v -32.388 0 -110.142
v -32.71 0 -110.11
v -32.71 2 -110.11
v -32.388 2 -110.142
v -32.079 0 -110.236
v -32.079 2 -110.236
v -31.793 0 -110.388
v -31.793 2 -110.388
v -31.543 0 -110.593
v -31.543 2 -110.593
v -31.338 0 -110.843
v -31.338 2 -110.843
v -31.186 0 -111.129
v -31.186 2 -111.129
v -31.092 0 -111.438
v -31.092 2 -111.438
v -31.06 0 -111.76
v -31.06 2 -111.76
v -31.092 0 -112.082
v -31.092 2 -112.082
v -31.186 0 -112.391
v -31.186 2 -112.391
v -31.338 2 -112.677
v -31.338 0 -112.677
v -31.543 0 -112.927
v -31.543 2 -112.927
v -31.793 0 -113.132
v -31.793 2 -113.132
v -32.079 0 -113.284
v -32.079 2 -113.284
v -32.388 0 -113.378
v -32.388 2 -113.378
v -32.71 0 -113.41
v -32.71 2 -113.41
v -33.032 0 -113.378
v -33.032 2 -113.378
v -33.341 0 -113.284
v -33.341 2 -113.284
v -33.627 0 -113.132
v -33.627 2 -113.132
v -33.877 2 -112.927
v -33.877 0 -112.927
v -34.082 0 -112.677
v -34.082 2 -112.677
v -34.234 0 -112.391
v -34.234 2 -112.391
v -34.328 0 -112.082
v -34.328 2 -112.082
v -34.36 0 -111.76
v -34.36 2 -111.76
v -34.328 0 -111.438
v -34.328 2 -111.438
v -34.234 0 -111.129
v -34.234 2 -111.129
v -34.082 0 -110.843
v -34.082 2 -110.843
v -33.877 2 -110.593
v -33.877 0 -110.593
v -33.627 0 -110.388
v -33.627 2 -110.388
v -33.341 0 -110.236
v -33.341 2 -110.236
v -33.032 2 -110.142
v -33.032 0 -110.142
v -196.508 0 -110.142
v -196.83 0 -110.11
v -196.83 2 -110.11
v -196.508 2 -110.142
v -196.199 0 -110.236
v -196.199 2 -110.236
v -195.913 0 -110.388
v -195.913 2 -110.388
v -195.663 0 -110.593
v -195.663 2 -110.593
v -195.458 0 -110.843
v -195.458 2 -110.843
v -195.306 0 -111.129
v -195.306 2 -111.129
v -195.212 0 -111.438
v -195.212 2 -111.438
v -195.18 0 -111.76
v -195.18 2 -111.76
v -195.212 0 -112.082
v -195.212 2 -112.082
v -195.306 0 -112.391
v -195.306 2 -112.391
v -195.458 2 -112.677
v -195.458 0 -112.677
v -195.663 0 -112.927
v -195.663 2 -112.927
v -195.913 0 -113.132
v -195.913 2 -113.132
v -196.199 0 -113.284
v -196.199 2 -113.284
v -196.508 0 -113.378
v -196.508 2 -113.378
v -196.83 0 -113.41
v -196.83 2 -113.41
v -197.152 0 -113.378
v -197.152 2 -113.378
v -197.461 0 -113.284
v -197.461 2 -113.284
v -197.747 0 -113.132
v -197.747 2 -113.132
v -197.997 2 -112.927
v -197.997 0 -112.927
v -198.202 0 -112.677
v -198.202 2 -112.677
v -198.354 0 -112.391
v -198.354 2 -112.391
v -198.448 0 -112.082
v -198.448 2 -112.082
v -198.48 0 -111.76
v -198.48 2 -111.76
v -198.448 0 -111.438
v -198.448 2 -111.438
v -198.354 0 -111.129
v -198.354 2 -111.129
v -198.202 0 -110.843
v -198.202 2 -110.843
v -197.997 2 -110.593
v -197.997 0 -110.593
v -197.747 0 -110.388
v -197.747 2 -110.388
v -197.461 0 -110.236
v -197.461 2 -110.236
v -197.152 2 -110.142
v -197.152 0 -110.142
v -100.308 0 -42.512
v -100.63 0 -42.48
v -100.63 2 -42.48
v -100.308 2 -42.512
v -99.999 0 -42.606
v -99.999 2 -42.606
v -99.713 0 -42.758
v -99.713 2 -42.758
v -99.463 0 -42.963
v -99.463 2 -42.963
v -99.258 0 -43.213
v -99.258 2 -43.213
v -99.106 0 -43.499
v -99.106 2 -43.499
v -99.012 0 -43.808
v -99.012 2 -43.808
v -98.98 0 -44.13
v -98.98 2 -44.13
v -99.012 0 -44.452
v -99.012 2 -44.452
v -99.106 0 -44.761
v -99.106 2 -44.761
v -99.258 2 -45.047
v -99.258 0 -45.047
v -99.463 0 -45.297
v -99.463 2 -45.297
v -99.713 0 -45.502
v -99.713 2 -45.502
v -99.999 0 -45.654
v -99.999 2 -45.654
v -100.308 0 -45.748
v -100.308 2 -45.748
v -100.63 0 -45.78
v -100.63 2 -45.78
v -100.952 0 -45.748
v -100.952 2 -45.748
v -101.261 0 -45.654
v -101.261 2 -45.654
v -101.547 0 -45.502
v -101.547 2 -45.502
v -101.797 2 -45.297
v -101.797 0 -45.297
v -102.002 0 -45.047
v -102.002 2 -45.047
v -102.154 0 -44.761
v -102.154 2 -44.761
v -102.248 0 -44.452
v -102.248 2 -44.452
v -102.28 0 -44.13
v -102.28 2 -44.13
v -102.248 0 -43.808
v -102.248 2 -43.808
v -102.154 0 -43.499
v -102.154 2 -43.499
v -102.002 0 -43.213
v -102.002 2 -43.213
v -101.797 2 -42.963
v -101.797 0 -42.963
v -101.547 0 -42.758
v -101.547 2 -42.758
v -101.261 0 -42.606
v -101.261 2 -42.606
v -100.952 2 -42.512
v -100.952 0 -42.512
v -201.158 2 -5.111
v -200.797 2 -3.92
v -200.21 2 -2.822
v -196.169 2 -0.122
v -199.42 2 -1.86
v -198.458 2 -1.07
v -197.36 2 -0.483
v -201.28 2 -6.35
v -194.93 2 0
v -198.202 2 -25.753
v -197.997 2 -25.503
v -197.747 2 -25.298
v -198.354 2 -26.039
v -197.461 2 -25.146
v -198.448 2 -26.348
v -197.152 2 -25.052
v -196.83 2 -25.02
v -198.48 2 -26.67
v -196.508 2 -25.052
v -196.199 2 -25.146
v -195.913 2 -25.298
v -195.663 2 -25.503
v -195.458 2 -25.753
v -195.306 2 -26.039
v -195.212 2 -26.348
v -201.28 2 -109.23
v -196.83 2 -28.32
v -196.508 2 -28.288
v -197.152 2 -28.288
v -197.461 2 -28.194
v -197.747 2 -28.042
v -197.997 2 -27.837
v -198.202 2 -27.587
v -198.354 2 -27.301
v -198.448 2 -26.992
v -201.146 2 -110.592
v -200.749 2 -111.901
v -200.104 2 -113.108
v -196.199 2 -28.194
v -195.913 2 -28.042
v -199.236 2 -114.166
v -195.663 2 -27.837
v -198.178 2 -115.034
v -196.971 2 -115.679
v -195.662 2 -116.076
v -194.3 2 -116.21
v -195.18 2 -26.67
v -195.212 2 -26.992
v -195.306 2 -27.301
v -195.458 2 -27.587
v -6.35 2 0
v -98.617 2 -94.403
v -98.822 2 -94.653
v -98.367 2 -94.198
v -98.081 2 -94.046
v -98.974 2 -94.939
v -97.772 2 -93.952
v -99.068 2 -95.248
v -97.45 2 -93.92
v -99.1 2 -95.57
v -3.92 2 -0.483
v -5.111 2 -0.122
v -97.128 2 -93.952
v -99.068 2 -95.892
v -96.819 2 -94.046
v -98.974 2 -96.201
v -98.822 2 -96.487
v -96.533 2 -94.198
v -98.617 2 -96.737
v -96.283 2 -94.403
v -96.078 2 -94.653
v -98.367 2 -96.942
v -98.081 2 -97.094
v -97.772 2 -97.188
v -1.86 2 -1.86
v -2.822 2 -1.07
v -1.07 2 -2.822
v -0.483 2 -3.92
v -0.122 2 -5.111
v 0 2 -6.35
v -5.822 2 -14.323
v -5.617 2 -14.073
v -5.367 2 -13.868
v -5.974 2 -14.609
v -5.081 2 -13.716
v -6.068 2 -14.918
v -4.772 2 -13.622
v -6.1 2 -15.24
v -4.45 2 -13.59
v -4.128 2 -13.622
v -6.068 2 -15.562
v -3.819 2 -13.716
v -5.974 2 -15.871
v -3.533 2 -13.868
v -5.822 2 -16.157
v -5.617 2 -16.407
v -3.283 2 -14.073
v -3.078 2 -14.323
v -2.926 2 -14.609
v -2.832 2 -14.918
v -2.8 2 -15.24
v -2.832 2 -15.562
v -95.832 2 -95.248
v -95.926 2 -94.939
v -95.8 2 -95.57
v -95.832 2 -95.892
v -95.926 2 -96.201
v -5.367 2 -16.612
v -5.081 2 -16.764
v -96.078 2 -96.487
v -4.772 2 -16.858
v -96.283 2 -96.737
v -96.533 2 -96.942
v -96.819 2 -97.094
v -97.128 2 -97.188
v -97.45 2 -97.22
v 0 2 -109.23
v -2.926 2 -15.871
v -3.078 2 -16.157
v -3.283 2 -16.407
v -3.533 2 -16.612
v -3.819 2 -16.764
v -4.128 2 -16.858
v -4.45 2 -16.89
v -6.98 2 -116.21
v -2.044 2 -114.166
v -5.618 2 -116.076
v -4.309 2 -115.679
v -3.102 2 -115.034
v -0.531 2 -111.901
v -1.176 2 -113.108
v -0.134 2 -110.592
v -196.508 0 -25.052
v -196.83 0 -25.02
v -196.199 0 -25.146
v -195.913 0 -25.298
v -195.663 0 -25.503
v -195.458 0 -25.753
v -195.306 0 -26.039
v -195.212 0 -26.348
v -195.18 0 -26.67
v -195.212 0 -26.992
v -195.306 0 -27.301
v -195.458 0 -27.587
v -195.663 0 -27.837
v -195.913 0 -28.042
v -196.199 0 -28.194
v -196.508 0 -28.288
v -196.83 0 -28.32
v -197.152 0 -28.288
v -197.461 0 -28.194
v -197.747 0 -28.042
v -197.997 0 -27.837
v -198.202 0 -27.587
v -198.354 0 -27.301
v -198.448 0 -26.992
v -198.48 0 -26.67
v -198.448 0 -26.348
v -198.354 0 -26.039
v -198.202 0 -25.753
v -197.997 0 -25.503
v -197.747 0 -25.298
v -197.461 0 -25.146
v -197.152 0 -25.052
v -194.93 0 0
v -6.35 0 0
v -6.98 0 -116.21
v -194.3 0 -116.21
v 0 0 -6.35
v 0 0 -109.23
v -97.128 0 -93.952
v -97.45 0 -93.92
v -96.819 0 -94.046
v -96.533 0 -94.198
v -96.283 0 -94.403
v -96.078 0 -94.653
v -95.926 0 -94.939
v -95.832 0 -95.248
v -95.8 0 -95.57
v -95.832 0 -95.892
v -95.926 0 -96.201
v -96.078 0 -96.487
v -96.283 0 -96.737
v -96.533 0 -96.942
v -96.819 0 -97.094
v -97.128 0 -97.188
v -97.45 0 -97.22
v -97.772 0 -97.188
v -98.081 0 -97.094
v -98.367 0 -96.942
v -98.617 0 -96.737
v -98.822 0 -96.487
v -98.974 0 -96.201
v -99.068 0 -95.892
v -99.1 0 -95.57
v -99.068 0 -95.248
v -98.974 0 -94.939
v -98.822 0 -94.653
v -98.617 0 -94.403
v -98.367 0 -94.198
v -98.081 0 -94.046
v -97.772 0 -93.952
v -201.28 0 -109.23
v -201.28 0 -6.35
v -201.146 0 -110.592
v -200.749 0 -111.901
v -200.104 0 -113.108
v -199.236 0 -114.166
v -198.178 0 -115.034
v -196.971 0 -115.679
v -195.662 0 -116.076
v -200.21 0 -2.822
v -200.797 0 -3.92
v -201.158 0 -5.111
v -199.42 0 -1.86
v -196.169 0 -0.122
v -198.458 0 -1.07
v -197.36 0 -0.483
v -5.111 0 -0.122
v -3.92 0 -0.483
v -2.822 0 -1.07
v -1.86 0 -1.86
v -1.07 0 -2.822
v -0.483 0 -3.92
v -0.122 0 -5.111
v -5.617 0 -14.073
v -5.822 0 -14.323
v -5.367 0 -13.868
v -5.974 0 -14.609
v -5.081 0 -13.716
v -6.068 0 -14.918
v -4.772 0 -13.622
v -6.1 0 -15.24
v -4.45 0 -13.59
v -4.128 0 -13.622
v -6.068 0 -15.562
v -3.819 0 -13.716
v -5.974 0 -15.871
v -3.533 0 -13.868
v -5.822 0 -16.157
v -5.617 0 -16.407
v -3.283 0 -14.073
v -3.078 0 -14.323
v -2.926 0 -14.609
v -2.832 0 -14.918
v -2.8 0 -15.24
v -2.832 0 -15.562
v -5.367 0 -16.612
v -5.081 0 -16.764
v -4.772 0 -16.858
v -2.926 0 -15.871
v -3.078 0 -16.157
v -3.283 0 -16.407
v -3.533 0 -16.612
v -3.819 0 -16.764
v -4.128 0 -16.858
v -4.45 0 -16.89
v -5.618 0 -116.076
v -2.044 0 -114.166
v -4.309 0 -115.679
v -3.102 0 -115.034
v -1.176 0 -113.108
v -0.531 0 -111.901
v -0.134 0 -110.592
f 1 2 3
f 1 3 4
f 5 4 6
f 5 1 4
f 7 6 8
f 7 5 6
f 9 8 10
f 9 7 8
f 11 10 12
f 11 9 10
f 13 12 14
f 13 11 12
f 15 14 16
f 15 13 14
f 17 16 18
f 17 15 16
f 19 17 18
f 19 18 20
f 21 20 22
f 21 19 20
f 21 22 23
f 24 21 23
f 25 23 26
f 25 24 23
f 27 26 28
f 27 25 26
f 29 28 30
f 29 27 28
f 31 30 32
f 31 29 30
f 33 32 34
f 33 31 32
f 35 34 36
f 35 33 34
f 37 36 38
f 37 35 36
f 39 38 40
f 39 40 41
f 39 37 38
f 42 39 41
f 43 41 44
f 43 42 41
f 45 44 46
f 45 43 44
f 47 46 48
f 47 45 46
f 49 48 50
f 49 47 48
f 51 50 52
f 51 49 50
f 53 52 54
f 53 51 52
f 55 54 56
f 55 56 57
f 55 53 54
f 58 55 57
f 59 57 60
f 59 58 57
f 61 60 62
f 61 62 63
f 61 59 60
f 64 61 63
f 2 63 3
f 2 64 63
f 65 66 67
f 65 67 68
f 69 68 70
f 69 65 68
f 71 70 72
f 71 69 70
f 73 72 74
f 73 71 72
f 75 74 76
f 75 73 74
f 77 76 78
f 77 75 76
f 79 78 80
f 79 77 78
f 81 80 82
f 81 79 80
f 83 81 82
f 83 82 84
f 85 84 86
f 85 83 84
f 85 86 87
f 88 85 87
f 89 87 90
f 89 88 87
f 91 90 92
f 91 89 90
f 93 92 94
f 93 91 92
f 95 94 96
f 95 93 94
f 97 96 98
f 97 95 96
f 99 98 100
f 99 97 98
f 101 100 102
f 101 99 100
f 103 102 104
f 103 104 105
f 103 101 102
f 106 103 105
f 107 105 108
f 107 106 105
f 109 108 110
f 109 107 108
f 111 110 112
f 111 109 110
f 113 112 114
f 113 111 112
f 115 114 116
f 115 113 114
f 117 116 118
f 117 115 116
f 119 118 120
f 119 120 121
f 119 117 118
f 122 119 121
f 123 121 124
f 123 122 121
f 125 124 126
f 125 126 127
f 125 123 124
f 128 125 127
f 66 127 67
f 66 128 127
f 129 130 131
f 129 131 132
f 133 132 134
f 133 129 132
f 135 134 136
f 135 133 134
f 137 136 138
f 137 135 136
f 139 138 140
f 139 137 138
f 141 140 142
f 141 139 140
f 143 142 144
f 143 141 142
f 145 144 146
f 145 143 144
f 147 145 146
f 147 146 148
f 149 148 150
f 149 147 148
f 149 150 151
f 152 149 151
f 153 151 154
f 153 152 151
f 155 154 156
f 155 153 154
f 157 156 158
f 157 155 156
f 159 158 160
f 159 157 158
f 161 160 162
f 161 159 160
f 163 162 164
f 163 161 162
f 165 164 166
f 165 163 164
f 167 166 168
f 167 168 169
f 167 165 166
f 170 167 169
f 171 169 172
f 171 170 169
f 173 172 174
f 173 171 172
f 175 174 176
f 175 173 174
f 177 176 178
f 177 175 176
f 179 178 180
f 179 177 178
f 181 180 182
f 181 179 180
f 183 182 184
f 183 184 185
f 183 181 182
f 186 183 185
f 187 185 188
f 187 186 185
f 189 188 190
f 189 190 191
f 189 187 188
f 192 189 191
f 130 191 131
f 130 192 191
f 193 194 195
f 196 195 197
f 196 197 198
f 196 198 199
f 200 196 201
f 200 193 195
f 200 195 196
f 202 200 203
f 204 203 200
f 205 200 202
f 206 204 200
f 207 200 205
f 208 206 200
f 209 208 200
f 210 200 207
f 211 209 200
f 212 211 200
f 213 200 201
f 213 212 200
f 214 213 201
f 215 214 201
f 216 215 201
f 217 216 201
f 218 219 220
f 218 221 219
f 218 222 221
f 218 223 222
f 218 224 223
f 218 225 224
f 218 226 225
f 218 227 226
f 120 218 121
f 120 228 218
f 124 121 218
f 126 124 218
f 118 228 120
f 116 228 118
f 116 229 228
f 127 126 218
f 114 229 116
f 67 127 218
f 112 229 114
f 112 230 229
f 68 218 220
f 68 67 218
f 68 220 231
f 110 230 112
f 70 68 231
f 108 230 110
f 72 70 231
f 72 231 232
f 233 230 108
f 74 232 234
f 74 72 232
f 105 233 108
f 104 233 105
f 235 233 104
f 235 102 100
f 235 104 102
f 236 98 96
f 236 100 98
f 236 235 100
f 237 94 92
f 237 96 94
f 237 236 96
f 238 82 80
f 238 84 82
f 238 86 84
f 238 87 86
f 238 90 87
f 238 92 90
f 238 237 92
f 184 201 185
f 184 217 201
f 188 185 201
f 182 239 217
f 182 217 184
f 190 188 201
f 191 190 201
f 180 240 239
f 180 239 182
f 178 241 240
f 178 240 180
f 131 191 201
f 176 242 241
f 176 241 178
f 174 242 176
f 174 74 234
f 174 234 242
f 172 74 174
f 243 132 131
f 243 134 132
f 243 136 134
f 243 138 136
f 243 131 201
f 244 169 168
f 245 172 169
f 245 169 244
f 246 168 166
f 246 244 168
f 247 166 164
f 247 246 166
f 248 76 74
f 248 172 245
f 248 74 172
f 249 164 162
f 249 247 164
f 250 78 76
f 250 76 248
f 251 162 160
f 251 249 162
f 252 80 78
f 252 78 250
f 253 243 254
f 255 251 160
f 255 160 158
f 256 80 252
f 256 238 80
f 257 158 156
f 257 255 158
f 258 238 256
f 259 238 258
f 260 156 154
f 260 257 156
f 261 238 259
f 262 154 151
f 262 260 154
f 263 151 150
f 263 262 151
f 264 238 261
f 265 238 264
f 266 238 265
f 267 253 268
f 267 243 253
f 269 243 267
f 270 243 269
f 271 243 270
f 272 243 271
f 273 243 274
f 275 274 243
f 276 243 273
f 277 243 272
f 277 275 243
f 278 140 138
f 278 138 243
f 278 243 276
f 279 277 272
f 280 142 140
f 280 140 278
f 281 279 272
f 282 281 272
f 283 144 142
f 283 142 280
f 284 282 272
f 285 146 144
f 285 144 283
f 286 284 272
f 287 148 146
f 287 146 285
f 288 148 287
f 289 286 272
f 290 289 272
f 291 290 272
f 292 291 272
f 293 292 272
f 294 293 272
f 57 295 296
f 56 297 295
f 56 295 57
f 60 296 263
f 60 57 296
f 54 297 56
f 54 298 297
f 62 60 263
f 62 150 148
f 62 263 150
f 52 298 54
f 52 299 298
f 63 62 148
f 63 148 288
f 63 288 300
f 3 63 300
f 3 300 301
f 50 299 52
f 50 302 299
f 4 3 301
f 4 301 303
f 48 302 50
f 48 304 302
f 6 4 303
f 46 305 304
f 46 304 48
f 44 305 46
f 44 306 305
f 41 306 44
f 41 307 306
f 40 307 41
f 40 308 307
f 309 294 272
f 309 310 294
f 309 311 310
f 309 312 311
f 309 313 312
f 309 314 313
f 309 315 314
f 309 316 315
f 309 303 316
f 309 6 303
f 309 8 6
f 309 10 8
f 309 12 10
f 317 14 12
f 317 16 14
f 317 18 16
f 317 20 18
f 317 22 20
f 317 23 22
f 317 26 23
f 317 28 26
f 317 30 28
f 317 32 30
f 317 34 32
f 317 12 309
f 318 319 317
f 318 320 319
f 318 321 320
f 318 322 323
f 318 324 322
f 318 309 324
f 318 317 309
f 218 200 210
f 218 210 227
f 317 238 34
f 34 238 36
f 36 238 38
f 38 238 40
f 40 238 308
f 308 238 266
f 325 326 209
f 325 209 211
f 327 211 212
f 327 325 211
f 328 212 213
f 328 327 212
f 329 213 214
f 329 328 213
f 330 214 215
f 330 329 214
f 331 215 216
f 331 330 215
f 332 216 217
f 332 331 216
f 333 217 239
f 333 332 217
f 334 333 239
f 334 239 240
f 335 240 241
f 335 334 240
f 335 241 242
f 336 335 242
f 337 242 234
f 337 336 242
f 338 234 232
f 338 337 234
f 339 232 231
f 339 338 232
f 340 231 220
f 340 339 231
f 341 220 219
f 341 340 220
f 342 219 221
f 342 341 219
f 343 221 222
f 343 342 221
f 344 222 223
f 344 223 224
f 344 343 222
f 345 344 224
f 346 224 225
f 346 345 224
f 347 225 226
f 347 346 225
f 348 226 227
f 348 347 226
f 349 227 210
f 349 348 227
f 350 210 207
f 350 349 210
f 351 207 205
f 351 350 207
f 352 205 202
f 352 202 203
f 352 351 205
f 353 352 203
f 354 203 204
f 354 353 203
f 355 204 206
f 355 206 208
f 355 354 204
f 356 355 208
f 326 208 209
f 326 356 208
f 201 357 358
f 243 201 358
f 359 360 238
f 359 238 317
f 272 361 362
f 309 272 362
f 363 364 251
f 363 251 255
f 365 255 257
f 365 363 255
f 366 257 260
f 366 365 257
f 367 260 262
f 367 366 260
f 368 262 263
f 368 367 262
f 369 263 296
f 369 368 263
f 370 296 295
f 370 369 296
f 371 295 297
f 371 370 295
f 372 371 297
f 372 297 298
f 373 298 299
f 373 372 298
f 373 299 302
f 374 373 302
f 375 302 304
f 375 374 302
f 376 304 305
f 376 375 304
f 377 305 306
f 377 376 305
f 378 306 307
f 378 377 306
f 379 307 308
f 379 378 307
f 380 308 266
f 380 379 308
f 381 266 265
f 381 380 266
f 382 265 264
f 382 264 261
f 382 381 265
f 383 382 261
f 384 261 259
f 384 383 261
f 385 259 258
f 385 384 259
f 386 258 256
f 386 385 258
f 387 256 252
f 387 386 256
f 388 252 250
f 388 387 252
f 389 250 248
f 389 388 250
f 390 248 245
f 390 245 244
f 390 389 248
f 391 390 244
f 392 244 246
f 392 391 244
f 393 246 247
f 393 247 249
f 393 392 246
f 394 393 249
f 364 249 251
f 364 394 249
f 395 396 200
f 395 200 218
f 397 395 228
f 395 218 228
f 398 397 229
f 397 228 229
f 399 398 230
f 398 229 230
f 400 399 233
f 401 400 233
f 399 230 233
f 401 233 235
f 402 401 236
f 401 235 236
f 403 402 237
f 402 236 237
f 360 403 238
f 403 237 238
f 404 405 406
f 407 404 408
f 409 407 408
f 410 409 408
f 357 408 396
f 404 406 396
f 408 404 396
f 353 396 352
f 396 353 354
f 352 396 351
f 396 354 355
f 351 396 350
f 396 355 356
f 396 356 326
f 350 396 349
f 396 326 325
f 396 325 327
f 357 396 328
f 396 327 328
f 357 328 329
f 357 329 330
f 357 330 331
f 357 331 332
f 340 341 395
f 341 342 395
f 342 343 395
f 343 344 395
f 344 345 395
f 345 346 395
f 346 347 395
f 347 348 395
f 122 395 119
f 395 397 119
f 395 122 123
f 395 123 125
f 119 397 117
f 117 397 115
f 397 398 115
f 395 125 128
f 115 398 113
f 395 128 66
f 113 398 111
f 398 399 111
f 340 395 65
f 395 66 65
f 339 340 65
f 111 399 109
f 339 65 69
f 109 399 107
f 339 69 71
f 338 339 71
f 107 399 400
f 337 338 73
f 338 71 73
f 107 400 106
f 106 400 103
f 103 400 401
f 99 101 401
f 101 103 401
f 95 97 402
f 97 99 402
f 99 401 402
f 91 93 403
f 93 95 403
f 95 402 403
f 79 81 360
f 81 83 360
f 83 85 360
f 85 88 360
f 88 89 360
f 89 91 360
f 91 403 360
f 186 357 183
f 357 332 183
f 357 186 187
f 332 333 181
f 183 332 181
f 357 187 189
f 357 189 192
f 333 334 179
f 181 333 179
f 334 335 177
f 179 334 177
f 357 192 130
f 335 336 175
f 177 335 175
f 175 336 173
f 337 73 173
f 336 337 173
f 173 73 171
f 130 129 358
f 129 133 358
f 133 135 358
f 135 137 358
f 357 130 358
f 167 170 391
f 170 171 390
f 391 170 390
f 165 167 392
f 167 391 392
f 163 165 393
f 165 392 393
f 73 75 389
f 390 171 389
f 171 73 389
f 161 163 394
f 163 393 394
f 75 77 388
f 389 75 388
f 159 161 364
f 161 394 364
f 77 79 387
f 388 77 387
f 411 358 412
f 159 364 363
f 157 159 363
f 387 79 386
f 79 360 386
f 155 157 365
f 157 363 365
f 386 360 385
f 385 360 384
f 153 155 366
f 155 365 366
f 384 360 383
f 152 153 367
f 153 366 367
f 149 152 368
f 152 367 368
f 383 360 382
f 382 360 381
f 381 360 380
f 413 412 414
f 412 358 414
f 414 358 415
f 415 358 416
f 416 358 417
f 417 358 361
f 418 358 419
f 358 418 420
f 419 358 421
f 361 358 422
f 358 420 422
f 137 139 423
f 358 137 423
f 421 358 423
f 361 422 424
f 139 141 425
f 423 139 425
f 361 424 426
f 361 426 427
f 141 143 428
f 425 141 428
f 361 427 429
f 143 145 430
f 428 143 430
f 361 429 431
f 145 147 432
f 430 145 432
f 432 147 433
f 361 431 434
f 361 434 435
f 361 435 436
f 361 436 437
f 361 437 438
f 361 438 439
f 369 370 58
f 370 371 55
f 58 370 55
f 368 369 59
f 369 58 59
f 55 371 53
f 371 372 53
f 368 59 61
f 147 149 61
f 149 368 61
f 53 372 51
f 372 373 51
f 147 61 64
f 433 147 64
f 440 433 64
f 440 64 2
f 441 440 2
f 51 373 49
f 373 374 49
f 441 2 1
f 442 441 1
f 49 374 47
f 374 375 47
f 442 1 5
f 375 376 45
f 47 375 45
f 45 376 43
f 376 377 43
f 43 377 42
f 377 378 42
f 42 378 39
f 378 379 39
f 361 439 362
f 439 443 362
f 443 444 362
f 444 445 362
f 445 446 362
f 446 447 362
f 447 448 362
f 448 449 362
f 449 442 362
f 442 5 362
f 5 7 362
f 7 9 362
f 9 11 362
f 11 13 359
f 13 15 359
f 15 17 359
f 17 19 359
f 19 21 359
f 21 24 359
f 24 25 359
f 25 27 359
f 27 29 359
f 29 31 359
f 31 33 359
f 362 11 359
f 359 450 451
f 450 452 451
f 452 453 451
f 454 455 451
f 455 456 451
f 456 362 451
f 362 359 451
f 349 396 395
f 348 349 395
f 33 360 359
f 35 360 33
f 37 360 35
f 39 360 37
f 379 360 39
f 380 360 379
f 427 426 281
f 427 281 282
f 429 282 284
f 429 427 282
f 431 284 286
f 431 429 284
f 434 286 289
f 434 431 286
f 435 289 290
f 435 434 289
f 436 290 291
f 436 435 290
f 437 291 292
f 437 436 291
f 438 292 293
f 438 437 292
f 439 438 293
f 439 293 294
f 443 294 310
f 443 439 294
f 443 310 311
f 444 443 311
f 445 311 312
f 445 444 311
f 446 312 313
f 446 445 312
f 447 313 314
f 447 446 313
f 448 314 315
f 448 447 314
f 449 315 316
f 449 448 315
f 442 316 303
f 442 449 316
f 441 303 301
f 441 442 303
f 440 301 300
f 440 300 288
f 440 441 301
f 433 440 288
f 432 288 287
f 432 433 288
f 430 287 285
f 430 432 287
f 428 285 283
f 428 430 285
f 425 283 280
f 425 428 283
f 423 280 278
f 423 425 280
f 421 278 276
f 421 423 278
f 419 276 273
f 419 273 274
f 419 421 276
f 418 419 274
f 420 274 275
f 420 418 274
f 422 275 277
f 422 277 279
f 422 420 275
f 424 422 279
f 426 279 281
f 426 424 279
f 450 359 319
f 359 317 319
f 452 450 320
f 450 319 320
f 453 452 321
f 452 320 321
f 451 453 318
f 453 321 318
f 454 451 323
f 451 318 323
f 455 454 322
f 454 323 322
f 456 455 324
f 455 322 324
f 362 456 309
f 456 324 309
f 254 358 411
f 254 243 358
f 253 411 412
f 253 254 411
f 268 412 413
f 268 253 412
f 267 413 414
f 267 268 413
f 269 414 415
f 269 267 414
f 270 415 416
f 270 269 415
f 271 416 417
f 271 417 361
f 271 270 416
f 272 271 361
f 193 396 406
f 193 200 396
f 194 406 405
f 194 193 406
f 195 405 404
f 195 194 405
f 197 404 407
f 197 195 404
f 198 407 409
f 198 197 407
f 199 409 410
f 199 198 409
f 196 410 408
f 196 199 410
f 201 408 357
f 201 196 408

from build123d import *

# Parameters (mm, degrees)
SKETCH1_W           = 201.28
SKETCH1_H           = 116.21
SKETCH1_R           = 1.65
BOSS_EXTRUDE1_DEPTH = 2
FILLET1_R           = 6.98
FILLET2_R           = 6.35


with BuildPart() as part:
    # Sketch1 → Boss-Extrude1 (new body)
    with BuildSketch(Plane(origin=(0, 0, 0), x_dir=(1, 0, 0), z_dir=(0, 1, 0))):
        with Locations((-100.64, 58.105)):
            Rectangle(SKETCH1_W, SKETCH1_H)
        with Locations(Location((-196.83, 26.67, 0), (0, 0, 270))):
            Circle(SKETCH1_R, mode=Mode.SUBTRACT)
        with Locations(Location((-196.83, 111.76, 0), (0, 0, 270))):
            Circle(SKETCH1_R, mode=Mode.SUBTRACT)
        with Locations(Location((-32.71, 111.76, 0), (0, 0, 270))):
            Circle(SKETCH1_R, mode=Mode.SUBTRACT)
        with Locations(Location((-4.45, 15.24, 0), (0, 0, 270))):
            Circle(SKETCH1_R, mode=Mode.SUBTRACT)
        with Locations(Location((-97.45, 95.57, 0), (0, 0, 270))):
            Circle(SKETCH1_R, mode=Mode.SUBTRACT)
        with Locations(Location((-100.63, 44.13, 0), (0, 0, 270))):
            Circle(SKETCH1_R, mode=Mode.SUBTRACT)
    extrude(amount=BOSS_EXTRUDE1_DEPTH)

    # Fillet1
    fillet1_edges = [part.edges().sort_by_distance(p)[0] for p in [
        (-201.28, 1, -116.21),
        (0, 1, -116.21),
    ]]
    fillet(fillet1_edges, radius=FILLET1_R)

    # Fillet2
    fillet2_edges = [part.edges().sort_by_distance(p)[0] for p in [
        (0, 1, 0),
        (-201.28, 1, 0),
    ]]
    fillet(fillet2_edges, radius=FILLET2_R)


solid = part.part
